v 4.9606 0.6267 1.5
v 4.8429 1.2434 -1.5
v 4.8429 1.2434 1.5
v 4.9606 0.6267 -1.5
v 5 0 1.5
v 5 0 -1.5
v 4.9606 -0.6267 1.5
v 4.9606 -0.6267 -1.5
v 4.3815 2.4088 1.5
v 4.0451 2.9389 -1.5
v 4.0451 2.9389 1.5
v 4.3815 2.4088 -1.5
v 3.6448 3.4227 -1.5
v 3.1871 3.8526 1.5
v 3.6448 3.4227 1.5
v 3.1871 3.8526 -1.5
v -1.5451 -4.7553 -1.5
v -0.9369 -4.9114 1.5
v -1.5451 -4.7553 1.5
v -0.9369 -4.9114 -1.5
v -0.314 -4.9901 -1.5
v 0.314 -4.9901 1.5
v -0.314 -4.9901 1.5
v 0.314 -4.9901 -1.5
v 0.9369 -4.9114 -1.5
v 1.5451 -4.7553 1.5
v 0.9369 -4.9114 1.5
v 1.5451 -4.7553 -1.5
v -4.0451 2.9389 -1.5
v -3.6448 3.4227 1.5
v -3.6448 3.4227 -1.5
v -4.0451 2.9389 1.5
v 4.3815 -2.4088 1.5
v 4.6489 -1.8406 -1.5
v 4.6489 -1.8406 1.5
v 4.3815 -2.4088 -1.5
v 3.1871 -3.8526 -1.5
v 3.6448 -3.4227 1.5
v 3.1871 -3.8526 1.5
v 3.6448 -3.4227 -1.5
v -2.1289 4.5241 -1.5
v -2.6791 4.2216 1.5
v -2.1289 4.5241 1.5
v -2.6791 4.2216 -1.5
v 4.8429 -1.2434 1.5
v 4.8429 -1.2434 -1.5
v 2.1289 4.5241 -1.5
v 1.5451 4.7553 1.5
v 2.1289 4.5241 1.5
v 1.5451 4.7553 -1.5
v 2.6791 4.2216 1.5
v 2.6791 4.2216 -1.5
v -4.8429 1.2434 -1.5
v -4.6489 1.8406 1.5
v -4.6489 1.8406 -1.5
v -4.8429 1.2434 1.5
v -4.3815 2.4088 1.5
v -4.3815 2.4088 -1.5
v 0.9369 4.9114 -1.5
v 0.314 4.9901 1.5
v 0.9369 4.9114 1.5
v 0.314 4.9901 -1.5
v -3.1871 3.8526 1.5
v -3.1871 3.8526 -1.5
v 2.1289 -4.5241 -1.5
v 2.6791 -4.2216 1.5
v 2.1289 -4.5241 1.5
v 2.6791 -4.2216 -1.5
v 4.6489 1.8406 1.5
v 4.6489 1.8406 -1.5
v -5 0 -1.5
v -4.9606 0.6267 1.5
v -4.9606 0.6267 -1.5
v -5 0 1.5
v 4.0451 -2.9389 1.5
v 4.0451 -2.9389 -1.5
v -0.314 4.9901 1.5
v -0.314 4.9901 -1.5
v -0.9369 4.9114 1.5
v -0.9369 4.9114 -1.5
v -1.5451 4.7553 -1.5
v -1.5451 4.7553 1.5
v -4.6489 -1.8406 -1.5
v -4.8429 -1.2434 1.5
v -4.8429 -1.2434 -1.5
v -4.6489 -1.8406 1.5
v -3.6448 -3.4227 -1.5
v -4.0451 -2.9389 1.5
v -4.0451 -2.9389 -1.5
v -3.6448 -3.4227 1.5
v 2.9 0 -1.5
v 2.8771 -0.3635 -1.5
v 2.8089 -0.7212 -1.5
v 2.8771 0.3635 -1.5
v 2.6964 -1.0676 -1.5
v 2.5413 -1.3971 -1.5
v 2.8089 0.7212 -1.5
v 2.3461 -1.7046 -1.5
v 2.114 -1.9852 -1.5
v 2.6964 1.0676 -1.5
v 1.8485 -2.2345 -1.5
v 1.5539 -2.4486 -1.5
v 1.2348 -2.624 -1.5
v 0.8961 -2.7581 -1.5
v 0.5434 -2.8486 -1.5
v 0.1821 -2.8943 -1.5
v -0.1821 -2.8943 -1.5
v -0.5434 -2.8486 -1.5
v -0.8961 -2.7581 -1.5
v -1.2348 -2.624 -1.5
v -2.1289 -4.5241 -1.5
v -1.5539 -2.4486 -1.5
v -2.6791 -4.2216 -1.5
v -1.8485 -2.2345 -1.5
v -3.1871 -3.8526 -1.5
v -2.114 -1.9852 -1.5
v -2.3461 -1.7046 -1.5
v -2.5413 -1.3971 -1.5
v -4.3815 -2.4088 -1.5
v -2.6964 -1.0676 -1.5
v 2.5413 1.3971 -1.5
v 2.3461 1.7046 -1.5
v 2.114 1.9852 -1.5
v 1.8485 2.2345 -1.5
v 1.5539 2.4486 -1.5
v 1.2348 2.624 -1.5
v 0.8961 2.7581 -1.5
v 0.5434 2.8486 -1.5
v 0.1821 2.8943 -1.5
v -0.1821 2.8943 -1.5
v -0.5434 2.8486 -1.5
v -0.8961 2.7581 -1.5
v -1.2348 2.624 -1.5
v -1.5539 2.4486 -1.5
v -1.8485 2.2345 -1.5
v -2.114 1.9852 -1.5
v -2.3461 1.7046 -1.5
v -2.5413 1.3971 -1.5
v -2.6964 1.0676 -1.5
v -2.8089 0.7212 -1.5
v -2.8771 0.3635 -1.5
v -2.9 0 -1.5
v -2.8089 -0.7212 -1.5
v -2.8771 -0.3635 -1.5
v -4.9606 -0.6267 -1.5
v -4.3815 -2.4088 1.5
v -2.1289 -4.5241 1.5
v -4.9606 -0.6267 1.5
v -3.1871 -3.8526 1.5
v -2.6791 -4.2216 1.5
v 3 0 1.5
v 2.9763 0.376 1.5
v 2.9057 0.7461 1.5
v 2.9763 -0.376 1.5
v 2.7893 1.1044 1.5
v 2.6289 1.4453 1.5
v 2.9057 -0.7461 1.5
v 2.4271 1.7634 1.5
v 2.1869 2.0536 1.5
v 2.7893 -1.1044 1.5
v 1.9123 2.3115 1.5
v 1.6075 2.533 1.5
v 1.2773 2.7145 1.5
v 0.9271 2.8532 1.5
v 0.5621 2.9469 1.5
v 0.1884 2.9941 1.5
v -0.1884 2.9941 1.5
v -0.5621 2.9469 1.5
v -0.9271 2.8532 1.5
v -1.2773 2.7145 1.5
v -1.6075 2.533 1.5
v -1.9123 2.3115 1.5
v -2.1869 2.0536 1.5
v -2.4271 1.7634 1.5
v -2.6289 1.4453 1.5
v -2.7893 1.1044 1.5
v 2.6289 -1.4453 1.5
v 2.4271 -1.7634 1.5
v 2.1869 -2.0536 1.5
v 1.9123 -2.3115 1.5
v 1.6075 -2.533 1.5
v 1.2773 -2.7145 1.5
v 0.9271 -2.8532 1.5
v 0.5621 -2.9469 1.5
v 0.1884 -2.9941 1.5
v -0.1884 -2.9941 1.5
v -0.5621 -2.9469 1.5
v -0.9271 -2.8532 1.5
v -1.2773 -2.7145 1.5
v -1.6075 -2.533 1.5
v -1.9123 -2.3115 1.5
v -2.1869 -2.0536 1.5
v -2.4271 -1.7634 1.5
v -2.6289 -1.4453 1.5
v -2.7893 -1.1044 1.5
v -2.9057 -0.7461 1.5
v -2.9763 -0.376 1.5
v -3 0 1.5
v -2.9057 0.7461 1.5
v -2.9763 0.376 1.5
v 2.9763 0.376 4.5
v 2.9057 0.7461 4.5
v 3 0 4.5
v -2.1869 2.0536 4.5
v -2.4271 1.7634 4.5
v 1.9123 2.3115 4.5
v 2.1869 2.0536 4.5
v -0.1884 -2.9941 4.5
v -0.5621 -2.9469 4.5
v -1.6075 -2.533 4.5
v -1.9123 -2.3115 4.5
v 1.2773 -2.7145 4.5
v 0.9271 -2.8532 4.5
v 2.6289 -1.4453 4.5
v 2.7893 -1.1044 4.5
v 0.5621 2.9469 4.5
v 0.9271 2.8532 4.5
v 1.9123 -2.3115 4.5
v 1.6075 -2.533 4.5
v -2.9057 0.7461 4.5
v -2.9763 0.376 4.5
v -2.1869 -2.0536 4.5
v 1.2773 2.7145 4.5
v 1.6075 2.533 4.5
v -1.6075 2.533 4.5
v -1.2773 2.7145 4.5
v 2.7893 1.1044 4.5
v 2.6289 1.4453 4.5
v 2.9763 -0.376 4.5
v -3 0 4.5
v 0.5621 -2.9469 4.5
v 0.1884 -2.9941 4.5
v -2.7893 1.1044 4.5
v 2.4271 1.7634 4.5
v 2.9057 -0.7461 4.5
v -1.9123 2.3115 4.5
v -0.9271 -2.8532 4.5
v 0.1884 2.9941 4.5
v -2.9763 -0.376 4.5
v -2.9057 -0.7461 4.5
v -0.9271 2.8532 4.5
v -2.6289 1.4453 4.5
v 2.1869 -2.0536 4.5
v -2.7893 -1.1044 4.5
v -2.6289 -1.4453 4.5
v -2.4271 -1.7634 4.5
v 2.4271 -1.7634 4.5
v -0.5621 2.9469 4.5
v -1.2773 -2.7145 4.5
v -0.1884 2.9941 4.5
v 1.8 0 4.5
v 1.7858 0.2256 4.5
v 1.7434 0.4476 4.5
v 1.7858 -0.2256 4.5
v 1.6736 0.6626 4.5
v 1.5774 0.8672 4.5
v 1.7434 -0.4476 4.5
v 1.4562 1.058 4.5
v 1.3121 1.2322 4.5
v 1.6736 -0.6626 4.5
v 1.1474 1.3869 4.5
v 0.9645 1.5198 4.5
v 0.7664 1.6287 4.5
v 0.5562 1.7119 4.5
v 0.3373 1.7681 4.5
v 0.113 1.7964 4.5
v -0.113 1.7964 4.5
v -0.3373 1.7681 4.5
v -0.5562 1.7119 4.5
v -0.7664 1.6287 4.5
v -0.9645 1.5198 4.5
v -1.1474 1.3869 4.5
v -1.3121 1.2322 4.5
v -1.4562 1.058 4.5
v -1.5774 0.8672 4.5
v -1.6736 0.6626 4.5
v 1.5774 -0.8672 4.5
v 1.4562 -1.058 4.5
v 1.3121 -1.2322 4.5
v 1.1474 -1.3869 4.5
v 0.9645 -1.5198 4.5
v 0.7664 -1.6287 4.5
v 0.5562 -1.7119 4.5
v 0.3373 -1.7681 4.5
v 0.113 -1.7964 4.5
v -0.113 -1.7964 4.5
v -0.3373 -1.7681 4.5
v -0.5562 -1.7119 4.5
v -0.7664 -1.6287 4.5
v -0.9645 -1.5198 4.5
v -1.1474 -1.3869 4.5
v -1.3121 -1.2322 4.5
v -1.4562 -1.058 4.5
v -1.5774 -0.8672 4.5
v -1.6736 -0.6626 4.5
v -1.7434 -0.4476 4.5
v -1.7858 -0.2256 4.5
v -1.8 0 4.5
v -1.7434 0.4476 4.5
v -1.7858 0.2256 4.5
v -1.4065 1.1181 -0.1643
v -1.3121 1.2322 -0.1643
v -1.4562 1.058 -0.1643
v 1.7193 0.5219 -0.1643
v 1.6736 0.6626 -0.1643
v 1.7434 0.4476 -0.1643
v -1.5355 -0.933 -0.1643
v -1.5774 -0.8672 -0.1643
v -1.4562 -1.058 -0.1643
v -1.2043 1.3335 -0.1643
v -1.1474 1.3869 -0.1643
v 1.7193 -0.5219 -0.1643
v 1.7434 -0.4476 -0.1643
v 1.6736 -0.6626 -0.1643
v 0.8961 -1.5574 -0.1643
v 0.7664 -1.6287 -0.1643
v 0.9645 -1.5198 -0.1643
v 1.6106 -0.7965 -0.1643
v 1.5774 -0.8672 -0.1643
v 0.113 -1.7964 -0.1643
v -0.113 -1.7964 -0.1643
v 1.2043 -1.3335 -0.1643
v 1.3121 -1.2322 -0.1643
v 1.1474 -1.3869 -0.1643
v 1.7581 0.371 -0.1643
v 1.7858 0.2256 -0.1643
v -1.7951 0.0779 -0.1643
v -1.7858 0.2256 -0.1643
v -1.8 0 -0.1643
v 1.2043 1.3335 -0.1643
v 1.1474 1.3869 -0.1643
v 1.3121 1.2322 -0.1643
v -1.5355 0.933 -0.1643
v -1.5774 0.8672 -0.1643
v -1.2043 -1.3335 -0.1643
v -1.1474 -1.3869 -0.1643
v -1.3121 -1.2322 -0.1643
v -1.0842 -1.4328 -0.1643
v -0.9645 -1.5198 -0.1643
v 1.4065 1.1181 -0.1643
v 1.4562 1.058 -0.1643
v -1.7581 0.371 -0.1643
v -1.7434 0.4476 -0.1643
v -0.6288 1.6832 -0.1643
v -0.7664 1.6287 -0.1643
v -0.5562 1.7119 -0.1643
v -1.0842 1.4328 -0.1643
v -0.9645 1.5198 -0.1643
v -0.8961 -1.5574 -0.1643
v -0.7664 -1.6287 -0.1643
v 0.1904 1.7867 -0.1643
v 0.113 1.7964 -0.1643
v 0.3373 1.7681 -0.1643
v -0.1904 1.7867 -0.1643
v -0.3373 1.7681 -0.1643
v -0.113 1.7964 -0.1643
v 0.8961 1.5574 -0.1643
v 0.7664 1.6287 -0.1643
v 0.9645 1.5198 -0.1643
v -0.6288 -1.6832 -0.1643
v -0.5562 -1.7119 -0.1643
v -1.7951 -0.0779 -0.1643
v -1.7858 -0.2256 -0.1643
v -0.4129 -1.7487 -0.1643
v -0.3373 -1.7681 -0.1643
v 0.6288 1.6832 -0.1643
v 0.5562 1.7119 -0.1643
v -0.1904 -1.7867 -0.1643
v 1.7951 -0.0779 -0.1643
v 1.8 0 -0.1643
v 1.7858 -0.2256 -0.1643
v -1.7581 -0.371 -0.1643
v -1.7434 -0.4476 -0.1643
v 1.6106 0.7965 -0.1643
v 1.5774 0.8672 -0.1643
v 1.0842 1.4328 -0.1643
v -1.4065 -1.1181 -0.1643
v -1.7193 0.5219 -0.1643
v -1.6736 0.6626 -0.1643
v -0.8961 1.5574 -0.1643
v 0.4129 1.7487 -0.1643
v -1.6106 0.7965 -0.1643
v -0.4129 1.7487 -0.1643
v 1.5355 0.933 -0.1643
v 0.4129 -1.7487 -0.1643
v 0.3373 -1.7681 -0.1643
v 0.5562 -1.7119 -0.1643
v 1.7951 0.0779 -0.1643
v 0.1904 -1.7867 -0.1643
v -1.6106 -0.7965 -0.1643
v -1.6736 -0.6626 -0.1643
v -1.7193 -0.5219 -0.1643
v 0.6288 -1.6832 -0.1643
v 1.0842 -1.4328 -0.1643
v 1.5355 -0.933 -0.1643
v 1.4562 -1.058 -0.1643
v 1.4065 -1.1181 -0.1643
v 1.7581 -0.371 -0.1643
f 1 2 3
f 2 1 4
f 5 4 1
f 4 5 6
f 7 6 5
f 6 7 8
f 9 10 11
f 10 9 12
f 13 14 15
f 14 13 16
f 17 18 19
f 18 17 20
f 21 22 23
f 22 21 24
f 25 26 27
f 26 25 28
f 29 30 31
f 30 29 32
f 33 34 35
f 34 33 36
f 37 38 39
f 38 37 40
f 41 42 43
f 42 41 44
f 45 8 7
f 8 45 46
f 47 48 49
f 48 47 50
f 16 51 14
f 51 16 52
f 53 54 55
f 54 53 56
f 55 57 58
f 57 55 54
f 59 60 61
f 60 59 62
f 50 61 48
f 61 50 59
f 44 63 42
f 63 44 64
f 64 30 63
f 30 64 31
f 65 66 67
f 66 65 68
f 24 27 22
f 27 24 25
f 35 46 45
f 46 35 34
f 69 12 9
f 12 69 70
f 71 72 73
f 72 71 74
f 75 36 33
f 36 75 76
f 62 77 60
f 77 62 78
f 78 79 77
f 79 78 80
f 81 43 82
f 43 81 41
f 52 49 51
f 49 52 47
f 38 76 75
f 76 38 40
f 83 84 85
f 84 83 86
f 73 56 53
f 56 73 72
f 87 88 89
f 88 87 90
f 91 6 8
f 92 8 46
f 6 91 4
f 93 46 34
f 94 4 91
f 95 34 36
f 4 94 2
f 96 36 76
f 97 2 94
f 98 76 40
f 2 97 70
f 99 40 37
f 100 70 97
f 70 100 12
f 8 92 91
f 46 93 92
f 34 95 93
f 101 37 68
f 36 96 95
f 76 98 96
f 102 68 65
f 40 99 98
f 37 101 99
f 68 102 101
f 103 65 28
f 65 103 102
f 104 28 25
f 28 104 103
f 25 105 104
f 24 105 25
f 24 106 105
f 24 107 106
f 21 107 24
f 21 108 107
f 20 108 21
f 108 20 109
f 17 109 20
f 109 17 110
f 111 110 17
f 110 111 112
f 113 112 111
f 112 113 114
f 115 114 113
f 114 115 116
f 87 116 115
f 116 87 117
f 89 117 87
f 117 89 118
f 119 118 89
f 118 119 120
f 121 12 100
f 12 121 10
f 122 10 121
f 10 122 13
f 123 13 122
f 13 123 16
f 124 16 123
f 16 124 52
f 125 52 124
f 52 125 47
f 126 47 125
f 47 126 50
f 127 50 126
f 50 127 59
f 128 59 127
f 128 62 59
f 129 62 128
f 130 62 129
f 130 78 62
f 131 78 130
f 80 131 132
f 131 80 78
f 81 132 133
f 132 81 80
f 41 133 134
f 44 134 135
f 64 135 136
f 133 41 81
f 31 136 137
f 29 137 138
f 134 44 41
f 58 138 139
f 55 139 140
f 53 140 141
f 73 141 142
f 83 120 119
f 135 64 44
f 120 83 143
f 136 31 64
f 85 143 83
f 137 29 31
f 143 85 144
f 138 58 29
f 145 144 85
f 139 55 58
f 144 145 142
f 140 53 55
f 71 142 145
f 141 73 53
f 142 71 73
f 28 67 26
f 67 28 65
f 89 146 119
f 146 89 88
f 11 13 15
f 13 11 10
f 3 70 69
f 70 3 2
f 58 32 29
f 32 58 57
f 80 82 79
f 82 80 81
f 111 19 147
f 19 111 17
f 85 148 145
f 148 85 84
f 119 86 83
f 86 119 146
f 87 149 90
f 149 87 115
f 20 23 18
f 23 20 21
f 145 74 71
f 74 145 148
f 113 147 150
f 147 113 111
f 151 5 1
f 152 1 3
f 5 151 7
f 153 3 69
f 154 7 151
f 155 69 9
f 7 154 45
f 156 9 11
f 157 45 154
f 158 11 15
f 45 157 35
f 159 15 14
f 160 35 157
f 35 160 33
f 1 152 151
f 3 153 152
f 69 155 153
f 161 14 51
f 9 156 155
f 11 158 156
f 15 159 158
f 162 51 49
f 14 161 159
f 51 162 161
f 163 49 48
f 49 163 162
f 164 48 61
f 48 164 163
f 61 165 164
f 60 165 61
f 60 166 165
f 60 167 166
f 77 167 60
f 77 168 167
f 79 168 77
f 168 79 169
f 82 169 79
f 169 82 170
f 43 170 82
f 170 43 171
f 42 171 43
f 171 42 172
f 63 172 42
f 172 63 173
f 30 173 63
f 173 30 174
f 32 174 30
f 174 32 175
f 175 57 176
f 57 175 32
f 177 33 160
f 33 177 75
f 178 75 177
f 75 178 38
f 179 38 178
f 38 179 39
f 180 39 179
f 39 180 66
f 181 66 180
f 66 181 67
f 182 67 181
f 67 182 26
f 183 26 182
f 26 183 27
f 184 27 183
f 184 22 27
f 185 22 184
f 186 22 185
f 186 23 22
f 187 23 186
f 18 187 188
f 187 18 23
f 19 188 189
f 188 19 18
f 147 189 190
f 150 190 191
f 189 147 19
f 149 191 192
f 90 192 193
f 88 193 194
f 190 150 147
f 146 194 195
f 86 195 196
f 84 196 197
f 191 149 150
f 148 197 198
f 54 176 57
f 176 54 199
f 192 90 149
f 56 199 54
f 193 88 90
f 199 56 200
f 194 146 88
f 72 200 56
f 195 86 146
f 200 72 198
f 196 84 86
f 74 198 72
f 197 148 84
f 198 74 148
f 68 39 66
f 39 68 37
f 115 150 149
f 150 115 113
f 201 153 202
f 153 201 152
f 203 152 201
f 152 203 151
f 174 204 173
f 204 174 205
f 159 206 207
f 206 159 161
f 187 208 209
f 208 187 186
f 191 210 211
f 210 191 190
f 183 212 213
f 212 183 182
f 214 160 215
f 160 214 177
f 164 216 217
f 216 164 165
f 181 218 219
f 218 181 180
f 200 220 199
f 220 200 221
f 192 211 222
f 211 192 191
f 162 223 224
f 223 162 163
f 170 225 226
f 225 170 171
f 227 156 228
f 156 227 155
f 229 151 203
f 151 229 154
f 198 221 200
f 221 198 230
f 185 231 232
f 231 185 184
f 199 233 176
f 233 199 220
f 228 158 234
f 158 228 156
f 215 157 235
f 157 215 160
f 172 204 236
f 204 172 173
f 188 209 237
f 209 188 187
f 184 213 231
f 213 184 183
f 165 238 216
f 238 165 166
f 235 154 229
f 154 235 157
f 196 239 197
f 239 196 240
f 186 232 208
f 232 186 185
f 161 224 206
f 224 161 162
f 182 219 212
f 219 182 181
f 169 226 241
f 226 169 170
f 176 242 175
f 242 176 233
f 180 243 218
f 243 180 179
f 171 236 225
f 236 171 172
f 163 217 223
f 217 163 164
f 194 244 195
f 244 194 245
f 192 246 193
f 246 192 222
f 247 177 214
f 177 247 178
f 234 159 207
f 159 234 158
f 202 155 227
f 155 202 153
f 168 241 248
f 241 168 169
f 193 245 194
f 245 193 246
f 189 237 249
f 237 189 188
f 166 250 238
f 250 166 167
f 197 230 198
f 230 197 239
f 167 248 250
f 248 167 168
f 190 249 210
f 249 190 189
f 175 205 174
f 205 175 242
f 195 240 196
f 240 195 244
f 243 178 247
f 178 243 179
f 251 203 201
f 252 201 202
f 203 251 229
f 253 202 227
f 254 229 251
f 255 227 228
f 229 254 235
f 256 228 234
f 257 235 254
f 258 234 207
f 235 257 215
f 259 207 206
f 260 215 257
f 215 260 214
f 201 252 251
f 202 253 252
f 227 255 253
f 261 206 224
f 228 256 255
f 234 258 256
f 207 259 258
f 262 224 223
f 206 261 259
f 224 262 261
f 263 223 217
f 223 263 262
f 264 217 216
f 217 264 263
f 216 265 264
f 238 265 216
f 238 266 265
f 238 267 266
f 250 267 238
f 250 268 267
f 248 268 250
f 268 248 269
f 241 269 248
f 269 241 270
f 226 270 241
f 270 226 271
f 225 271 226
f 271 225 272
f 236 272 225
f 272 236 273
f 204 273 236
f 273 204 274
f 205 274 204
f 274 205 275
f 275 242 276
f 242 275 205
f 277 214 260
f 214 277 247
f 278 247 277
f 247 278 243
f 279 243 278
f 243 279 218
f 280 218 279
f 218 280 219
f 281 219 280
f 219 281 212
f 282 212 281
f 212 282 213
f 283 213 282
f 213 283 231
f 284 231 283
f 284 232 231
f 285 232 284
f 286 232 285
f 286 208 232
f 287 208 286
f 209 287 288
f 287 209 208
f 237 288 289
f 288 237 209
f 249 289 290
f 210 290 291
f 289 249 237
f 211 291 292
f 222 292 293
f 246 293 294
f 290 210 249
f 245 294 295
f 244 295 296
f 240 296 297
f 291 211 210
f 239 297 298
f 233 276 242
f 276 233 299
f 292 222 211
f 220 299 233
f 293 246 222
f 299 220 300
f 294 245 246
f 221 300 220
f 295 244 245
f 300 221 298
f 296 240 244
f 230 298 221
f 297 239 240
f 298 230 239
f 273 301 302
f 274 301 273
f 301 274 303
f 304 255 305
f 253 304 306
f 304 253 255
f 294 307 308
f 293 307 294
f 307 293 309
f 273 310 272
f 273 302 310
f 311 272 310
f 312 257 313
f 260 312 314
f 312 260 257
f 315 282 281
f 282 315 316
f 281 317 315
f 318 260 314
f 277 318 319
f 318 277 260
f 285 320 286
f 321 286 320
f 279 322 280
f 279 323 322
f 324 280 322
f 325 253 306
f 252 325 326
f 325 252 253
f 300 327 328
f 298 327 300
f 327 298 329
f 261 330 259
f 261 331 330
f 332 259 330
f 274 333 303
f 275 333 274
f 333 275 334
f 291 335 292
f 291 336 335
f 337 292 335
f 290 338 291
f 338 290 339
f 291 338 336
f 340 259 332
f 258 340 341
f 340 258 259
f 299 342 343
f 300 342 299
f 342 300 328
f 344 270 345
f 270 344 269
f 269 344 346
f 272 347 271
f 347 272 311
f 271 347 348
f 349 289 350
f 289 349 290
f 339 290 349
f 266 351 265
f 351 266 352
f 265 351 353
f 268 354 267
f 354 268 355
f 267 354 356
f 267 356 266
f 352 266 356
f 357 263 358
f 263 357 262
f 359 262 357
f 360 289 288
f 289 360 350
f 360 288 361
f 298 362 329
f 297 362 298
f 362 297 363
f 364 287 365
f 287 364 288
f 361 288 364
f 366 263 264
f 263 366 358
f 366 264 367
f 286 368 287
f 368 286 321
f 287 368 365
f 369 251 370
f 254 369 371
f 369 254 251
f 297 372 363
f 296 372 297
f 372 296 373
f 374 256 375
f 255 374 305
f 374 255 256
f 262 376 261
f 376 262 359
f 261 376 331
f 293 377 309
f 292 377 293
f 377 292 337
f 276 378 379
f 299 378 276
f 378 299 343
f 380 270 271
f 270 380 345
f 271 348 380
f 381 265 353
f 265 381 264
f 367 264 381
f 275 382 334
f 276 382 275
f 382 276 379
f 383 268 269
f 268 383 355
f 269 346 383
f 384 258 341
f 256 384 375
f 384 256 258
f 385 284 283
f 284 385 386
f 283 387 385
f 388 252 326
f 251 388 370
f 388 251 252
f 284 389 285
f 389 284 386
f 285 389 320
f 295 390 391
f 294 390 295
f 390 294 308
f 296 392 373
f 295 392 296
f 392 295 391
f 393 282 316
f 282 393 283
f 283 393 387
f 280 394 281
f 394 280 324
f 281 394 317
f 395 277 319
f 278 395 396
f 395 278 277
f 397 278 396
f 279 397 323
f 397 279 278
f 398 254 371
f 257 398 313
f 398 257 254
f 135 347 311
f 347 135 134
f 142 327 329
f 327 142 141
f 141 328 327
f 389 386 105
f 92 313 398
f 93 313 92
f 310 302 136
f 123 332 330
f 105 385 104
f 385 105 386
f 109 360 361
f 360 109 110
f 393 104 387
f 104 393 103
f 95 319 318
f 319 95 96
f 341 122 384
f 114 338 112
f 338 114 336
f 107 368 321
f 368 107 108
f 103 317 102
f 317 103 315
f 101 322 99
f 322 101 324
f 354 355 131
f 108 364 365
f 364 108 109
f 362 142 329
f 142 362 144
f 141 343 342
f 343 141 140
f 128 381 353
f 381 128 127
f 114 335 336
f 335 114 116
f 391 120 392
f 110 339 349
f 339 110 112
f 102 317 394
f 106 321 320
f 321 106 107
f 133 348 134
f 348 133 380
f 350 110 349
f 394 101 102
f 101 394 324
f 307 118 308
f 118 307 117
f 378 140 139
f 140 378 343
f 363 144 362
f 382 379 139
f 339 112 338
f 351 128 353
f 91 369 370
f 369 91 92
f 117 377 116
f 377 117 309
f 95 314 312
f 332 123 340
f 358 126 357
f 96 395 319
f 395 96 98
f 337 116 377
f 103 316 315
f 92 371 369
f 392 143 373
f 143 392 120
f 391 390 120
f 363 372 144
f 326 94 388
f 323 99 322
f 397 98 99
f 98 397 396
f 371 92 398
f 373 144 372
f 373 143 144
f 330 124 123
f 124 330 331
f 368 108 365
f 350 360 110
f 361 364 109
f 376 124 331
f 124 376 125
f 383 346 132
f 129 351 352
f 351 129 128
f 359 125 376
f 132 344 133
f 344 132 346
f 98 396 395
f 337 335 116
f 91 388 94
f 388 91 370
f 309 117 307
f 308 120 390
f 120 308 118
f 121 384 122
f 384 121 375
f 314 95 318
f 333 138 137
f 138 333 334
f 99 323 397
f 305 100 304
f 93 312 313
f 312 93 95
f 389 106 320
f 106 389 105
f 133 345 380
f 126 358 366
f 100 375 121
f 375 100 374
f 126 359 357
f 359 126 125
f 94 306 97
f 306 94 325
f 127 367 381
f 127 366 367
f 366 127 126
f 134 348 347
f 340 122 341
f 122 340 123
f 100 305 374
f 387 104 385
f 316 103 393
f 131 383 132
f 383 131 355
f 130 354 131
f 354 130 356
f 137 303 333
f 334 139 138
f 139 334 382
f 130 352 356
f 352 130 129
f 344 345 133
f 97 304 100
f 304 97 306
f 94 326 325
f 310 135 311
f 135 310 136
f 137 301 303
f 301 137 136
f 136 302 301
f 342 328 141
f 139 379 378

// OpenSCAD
$fn = 50;


difference() {
	union() {
		translate(v = [0, 0, -1.5000000000]) {
			cylinder(h = 3, r = 5.0000000000);
		}
		translate(v = [0, 0, -1.5000000000]) {
			cylinder(h = 6, r = 3.0000000000);
		}
	}
	union() {
		translate(v = [0, 0, -1.5000000000]) {
			rotate(a = [0, 180, 0]) {
				difference() {
					union() {
						translate(v = [0, 0, -6.0000000000]) {
							cylinder(h = 6, r = 1.5000000000);
						}
						translate(v = [0, 0, -6.0000000000]) {
							cylinder(h = 6, r = 1.8000000000);
						}
						translate(v = [0, 0, -1.7000000000]) {
							cylinder(h = 1.7000000000, r1 = 1.5000000000, r2 = 2.9000000000);
						}
						translate(v = [0, 0, -6.0000000000]) {
							cylinder(h = 6, r = 1.5000000000);
						}
					}
					union();
				}
			}
		}
		translate(v = [0, 0, -50.0000000000]) {
			cylinder(h = 100, r = 1.5000000000);
		}
	}
}
